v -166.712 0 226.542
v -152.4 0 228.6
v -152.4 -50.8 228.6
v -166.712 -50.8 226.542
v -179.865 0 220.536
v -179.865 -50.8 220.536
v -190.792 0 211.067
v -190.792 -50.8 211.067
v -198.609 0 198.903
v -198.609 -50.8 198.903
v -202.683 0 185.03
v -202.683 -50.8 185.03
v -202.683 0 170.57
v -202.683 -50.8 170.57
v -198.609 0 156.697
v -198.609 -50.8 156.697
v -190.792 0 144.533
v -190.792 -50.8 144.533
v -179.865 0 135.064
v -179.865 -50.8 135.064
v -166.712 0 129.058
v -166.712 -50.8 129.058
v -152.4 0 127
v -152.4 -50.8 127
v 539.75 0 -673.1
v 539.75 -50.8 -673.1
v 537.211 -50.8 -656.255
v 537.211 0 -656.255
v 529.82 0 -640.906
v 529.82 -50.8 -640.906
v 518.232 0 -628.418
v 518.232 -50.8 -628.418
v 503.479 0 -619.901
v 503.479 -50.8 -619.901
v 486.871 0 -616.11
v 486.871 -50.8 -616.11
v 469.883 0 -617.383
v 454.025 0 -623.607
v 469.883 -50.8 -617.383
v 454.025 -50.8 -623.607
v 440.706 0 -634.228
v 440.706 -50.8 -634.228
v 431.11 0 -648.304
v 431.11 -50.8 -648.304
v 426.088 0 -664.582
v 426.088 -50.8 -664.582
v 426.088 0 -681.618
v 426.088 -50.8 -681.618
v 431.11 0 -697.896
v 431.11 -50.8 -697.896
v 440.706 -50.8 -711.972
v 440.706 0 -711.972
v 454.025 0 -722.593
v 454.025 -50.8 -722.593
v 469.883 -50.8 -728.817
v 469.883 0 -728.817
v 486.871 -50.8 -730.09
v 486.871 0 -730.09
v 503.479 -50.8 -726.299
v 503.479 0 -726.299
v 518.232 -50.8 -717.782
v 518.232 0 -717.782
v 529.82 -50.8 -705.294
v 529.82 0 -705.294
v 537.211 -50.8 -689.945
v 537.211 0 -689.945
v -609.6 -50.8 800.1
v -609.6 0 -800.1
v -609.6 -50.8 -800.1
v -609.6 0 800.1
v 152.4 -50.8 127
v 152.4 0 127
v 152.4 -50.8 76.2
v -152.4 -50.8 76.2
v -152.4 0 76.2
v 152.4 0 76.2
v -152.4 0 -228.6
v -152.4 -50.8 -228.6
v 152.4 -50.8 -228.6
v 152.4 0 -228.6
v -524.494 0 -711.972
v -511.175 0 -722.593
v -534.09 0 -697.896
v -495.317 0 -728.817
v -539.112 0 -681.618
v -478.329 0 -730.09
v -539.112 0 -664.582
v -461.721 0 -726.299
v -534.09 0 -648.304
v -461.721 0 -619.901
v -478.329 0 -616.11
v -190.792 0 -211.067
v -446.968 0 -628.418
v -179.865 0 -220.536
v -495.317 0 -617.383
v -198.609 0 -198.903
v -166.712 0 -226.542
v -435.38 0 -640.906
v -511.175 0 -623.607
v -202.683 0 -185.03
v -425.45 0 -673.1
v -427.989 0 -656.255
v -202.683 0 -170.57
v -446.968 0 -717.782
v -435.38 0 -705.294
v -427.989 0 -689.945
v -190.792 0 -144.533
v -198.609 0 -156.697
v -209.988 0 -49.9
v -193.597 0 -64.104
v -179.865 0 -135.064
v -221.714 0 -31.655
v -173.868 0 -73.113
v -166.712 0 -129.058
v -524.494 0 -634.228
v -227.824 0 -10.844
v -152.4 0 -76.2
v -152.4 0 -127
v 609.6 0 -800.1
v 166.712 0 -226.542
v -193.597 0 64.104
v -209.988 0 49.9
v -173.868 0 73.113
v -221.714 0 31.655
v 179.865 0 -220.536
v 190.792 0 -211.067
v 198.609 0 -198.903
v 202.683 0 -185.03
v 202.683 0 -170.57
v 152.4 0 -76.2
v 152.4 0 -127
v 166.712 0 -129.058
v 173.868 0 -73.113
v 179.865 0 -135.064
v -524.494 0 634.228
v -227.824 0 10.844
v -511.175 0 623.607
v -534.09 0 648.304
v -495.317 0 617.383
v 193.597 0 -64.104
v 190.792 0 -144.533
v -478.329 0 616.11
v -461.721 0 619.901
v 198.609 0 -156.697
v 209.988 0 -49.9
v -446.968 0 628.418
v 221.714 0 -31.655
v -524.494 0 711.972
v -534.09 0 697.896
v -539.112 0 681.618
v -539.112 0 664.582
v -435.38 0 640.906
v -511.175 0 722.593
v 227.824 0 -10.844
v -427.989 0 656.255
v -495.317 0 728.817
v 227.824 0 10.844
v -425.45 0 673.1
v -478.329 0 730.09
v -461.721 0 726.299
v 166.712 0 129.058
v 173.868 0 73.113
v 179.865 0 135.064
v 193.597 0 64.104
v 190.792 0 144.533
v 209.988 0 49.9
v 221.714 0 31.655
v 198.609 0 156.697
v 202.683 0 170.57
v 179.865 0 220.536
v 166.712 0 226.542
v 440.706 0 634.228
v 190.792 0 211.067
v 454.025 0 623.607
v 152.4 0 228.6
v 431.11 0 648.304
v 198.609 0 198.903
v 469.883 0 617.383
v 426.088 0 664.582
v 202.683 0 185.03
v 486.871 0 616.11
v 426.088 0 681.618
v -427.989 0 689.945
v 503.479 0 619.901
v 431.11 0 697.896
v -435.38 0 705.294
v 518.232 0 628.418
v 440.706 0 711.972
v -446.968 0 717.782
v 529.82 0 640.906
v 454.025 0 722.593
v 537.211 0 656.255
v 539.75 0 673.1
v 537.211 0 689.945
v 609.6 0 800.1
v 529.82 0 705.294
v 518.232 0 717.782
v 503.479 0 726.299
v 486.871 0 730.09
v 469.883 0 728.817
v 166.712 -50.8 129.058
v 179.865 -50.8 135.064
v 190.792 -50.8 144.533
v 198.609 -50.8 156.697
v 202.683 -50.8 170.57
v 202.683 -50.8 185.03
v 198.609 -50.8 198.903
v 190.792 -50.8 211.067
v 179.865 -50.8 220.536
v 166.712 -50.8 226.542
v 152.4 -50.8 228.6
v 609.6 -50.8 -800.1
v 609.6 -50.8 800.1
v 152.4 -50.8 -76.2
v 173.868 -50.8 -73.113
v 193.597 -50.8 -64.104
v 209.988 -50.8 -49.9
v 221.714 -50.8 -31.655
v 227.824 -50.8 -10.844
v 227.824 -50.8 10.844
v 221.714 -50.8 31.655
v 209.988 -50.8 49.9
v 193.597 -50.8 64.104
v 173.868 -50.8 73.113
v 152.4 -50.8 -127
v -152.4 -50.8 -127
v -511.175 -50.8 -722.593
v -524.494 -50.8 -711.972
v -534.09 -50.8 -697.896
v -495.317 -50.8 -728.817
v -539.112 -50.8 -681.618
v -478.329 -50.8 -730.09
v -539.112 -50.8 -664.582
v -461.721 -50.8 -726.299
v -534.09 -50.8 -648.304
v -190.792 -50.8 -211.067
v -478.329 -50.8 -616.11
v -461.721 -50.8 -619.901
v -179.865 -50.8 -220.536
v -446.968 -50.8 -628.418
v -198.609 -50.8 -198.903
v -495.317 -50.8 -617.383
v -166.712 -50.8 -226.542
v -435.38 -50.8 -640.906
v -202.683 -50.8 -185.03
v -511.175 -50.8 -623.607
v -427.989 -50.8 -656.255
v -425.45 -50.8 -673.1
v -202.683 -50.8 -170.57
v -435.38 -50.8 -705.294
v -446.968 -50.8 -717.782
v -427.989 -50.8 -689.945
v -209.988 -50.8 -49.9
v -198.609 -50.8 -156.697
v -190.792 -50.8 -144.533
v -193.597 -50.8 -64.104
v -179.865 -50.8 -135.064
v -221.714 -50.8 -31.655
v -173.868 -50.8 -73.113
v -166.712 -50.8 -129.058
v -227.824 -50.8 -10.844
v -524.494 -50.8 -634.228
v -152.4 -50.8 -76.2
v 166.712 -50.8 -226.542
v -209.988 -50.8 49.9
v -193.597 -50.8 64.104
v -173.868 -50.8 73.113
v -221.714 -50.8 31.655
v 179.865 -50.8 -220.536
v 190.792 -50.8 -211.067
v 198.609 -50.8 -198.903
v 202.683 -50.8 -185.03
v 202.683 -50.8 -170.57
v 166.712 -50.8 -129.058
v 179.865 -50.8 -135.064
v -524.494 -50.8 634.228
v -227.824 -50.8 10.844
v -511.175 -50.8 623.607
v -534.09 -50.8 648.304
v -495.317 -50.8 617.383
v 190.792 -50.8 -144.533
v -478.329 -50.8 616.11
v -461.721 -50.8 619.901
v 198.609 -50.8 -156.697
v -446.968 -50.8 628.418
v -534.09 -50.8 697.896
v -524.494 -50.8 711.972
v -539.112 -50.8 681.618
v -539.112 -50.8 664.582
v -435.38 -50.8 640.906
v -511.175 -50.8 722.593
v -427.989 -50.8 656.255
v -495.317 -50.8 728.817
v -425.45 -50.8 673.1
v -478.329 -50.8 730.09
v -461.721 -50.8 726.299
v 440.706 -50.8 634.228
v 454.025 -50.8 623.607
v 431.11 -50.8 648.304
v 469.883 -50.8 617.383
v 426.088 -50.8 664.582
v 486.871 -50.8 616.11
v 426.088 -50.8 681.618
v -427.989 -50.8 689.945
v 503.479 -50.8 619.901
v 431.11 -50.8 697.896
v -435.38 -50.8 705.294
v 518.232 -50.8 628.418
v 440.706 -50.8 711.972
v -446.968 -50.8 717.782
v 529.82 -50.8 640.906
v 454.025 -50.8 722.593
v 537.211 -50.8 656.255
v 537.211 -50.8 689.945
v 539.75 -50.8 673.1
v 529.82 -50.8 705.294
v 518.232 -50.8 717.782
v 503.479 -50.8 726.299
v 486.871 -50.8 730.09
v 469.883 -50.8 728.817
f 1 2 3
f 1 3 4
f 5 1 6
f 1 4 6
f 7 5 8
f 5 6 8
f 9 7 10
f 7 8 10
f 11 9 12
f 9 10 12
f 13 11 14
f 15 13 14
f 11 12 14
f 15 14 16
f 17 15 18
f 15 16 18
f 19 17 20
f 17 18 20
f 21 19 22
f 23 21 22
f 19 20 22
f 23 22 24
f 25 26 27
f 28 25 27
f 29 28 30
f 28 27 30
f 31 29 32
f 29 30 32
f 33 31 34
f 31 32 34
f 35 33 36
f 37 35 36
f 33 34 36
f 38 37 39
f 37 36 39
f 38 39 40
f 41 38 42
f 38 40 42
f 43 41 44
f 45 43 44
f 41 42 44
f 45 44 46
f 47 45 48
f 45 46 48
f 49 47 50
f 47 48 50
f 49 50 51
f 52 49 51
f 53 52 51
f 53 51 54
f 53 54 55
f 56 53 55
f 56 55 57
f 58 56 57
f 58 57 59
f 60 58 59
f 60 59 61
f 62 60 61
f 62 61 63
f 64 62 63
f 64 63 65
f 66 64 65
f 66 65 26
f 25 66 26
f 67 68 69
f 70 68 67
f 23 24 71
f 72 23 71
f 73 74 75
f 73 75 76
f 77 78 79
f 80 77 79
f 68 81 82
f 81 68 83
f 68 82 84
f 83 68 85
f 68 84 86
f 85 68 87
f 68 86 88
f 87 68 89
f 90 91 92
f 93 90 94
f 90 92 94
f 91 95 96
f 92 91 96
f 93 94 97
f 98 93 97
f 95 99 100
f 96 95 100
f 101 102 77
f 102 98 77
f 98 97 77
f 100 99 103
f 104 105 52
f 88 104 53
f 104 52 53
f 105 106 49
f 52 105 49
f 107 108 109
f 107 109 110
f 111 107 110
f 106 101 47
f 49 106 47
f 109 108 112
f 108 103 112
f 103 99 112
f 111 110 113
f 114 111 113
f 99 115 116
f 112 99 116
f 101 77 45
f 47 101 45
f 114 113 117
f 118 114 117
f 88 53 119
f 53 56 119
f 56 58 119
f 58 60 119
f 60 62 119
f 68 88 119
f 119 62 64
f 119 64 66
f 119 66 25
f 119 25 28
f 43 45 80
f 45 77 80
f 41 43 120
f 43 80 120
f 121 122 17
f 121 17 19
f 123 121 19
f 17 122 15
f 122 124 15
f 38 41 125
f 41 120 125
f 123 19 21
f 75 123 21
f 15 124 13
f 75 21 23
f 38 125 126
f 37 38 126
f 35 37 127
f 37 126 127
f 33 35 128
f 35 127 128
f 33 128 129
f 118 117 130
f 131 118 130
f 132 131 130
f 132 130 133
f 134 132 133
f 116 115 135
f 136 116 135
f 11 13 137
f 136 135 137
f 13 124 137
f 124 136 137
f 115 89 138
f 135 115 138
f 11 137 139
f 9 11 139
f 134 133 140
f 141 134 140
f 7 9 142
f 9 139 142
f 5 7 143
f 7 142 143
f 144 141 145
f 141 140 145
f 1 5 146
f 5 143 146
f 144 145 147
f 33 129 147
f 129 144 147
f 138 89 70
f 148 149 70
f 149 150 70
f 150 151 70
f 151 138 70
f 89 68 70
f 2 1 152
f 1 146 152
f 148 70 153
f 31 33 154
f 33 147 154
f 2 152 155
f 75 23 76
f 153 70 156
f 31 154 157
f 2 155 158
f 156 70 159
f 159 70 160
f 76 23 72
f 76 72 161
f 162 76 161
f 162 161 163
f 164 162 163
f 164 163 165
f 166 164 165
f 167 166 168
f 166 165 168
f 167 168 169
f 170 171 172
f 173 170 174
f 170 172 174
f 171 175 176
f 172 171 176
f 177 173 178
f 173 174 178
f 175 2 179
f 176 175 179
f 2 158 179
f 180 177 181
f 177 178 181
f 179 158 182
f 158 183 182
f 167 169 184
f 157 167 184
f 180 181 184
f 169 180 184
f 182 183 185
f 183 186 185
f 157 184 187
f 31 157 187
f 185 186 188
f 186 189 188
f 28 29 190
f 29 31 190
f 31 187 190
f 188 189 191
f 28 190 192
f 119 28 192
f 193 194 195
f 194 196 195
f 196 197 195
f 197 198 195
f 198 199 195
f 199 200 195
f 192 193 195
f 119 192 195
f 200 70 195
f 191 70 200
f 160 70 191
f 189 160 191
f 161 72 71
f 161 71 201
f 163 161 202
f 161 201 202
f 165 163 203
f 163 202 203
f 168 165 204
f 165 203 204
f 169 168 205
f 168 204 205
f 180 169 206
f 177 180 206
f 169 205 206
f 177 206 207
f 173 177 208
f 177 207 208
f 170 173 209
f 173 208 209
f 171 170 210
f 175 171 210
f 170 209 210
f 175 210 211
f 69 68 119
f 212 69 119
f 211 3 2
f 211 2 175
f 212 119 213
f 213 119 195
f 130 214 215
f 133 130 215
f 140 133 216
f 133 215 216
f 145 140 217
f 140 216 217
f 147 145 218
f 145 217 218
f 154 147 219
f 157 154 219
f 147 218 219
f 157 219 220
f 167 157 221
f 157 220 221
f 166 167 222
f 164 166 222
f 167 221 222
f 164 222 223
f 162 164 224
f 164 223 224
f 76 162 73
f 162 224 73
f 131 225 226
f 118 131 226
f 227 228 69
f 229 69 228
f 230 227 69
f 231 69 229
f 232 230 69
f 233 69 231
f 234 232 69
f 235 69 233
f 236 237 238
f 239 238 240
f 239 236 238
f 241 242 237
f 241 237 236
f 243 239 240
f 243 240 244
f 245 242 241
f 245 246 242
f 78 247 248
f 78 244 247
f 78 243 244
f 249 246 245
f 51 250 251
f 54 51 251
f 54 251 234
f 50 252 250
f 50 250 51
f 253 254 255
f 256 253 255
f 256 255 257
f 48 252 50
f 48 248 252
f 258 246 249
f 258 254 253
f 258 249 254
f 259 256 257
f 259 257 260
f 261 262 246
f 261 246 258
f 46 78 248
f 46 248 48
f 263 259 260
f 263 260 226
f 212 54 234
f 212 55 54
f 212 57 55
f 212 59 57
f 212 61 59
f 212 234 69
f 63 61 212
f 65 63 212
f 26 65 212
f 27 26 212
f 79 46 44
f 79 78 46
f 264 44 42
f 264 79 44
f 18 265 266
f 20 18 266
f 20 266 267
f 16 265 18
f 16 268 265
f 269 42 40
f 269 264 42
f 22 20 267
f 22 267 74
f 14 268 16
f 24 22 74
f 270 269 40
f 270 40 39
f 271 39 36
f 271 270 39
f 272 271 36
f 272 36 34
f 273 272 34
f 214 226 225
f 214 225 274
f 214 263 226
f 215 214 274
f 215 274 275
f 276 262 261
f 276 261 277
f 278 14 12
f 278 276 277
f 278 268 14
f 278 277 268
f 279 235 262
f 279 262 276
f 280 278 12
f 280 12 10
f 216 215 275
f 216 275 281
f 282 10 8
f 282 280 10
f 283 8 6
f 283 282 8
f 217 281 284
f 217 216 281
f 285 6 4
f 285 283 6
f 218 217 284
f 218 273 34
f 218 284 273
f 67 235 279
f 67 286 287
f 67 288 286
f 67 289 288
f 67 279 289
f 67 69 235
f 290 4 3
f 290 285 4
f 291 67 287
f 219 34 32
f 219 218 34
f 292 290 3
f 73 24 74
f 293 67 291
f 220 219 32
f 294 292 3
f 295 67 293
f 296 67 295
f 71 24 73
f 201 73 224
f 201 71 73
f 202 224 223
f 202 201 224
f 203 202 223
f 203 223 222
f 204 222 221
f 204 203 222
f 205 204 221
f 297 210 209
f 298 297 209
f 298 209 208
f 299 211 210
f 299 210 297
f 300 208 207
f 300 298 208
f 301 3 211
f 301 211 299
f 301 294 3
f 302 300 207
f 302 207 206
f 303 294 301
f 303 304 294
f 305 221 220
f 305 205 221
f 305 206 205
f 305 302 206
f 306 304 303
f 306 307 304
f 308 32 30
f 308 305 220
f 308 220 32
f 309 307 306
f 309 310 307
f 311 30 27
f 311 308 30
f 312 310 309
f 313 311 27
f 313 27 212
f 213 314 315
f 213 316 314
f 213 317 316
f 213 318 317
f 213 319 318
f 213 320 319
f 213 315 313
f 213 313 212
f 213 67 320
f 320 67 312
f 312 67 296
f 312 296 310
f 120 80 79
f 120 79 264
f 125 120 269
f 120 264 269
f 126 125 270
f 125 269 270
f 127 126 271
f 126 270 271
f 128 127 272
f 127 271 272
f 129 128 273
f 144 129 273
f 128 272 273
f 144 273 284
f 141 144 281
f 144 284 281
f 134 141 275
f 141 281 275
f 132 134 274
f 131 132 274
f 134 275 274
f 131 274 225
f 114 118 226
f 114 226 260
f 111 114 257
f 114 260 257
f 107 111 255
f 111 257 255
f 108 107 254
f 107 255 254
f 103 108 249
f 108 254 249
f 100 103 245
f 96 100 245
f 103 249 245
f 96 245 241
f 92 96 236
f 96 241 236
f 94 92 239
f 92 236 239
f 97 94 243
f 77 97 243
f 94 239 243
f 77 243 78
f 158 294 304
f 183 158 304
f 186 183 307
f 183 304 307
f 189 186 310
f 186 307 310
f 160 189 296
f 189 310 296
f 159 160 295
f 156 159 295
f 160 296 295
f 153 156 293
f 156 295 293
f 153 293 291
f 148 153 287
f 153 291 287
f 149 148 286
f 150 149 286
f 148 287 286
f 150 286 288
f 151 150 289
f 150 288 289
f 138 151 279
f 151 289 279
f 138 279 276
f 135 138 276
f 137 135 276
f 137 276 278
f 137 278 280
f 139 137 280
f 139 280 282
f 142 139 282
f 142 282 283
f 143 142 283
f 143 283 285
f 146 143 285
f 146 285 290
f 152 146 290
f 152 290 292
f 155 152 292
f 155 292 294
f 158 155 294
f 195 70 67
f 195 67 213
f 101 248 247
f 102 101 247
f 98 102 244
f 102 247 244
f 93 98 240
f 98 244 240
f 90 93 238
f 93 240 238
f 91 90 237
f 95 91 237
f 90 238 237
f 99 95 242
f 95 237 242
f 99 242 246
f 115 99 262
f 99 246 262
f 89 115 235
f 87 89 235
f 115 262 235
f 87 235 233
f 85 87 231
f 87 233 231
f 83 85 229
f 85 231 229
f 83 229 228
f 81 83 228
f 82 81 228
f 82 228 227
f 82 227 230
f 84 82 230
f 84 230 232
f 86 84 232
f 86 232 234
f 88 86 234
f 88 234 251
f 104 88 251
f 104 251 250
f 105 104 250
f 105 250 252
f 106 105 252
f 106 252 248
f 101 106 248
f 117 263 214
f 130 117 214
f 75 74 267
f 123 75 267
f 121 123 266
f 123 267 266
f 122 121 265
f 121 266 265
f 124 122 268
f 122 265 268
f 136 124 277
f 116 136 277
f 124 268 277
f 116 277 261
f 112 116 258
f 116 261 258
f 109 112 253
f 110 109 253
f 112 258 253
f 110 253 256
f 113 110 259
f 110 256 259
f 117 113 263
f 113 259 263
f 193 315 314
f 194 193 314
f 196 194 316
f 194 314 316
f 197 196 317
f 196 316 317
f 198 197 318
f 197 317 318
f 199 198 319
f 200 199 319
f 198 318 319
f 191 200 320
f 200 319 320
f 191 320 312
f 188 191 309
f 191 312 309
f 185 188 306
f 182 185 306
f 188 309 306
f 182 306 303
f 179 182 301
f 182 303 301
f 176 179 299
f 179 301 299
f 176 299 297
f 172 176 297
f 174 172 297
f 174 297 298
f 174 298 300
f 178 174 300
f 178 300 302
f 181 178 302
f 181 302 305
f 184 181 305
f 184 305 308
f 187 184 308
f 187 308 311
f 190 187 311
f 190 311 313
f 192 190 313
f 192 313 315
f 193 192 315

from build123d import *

# Parameters (mm, degrees)
F1_W     = 1219.2
F1_H     = 1600.2
F2_DEPTH = 50.8
F3_R     = 57.15
F4_DEPTH = 76.2
F5_W     = 304.8
F5_H     = 101.6
F5_H_2   = 152.4
F6_DEPTH = 76.2
F7_DEPTH = 76.2


with BuildPart() as f2:
    # F1 (on face) → F2 (new body)
    with BuildSketch(Plane.XZ):
        Rectangle(F1_W, F1_H)
    extrude(amount=F2_DEPTH)

    # F3 (on face) → F4 (cut)
    with BuildSketch(Plane.XZ.offset(50.8)):
        with Locations((-482.6, 673.1)):
            Circle(F3_R)
        with Locations((482.6, 673.1)):
            Circle(F3_R)
        with Locations((-482.6, -673.1)):
            Circle(F3_R)
        with Locations((482.6, -673.1)):
            Circle(F3_R)
    extrude(amount=-F4_DEPTH, mode=Mode.SUBTRACT)

    # F5 (on face) → F6 (cut)
    with BuildSketch(Plane.XZ.offset(50.8)):
        with Locations((0, 177.8)):
            Rectangle(F5_W, F5_H)
        with BuildLine():
            ThreePointArc((-152.4, 228.6), (-203.2, 177.8), (-152.4, 127))
            Line((-152.4, 127), (-152.4, 228.6))
        make_face()
        with BuildLine():
            Line((152.4, 228.6), (152.4, 127))
            ThreePointArc((152.4, 127), (203.2, 177.8), (152.4, 228.6))
        make_face()
        with BuildLine():
            Line((152.4, -127), (-152.4, -127))
            ThreePointArc((-152.4, -127), (-203.2, -177.8), (-152.4, -228.6))
            Line((-152.4, -228.6), (152.4, -228.6))
            ThreePointArc((152.4, -228.6), (203.2, -177.8), (152.4, -127))
        make_face()
        Rectangle(F5_W, F5_H_2)
        with BuildLine():
            ThreePointArc((-152.4, 76.2), (-228.6, 0), (-152.4, -76.2))
            Line((-152.4, -76.2), (-152.4, 76.2))
        make_face()
        with BuildLine():
            Line((152.4, 76.2), (152.4, -76.2))
            ThreePointArc((152.4, -76.2), (228.6, 0), (152.4, 76.2))
        make_face()
    extrude(amount=-F6_DEPTH, mode=Mode.SUBTRACT)

    # F5 (on face) → F7 (cut)
    with BuildSketch(Plane.XZ.offset(50.8)):
        with Locations((0, 177.8)):
            Rectangle(F5_W, F5_H)
        with BuildLine():
            ThreePointArc((-152.4, 228.6), (-203.2, 177.8), (-152.4, 127))
            Line((-152.4, 127), (-152.4, 228.6))
        make_face()
        with BuildLine():
            Line((152.4, 228.6), (152.4, 127))
            ThreePointArc((152.4, 127), (203.2, 177.8), (152.4, 228.6))
        make_face()
        with BuildLine():
            Line((152.4, -127), (-152.4, -127))
            ThreePointArc((-152.4, -127), (-203.2, -177.8), (-152.4, -228.6))
            Line((-152.4, -228.6), (152.4, -228.6))
            ThreePointArc((152.4, -228.6), (203.2, -177.8), (152.4, -127))
        make_face()
        Rectangle(F5_W, F5_H_2)
        with BuildLine():
            ThreePointArc((-152.4, 76.2), (-228.6, 0), (-152.4, -76.2))
            Line((-152.4, -76.2), (-152.4, 76.2))
        make_face()
        with BuildLine():
            Line((152.4, 76.2), (152.4, -76.2))
            ThreePointArc((152.4, -76.2), (228.6, 0), (152.4, 76.2))
        make_face()
    extrude(amount=-F7_DEPTH, mode=Mode.SUBTRACT)


solid = f2.part
